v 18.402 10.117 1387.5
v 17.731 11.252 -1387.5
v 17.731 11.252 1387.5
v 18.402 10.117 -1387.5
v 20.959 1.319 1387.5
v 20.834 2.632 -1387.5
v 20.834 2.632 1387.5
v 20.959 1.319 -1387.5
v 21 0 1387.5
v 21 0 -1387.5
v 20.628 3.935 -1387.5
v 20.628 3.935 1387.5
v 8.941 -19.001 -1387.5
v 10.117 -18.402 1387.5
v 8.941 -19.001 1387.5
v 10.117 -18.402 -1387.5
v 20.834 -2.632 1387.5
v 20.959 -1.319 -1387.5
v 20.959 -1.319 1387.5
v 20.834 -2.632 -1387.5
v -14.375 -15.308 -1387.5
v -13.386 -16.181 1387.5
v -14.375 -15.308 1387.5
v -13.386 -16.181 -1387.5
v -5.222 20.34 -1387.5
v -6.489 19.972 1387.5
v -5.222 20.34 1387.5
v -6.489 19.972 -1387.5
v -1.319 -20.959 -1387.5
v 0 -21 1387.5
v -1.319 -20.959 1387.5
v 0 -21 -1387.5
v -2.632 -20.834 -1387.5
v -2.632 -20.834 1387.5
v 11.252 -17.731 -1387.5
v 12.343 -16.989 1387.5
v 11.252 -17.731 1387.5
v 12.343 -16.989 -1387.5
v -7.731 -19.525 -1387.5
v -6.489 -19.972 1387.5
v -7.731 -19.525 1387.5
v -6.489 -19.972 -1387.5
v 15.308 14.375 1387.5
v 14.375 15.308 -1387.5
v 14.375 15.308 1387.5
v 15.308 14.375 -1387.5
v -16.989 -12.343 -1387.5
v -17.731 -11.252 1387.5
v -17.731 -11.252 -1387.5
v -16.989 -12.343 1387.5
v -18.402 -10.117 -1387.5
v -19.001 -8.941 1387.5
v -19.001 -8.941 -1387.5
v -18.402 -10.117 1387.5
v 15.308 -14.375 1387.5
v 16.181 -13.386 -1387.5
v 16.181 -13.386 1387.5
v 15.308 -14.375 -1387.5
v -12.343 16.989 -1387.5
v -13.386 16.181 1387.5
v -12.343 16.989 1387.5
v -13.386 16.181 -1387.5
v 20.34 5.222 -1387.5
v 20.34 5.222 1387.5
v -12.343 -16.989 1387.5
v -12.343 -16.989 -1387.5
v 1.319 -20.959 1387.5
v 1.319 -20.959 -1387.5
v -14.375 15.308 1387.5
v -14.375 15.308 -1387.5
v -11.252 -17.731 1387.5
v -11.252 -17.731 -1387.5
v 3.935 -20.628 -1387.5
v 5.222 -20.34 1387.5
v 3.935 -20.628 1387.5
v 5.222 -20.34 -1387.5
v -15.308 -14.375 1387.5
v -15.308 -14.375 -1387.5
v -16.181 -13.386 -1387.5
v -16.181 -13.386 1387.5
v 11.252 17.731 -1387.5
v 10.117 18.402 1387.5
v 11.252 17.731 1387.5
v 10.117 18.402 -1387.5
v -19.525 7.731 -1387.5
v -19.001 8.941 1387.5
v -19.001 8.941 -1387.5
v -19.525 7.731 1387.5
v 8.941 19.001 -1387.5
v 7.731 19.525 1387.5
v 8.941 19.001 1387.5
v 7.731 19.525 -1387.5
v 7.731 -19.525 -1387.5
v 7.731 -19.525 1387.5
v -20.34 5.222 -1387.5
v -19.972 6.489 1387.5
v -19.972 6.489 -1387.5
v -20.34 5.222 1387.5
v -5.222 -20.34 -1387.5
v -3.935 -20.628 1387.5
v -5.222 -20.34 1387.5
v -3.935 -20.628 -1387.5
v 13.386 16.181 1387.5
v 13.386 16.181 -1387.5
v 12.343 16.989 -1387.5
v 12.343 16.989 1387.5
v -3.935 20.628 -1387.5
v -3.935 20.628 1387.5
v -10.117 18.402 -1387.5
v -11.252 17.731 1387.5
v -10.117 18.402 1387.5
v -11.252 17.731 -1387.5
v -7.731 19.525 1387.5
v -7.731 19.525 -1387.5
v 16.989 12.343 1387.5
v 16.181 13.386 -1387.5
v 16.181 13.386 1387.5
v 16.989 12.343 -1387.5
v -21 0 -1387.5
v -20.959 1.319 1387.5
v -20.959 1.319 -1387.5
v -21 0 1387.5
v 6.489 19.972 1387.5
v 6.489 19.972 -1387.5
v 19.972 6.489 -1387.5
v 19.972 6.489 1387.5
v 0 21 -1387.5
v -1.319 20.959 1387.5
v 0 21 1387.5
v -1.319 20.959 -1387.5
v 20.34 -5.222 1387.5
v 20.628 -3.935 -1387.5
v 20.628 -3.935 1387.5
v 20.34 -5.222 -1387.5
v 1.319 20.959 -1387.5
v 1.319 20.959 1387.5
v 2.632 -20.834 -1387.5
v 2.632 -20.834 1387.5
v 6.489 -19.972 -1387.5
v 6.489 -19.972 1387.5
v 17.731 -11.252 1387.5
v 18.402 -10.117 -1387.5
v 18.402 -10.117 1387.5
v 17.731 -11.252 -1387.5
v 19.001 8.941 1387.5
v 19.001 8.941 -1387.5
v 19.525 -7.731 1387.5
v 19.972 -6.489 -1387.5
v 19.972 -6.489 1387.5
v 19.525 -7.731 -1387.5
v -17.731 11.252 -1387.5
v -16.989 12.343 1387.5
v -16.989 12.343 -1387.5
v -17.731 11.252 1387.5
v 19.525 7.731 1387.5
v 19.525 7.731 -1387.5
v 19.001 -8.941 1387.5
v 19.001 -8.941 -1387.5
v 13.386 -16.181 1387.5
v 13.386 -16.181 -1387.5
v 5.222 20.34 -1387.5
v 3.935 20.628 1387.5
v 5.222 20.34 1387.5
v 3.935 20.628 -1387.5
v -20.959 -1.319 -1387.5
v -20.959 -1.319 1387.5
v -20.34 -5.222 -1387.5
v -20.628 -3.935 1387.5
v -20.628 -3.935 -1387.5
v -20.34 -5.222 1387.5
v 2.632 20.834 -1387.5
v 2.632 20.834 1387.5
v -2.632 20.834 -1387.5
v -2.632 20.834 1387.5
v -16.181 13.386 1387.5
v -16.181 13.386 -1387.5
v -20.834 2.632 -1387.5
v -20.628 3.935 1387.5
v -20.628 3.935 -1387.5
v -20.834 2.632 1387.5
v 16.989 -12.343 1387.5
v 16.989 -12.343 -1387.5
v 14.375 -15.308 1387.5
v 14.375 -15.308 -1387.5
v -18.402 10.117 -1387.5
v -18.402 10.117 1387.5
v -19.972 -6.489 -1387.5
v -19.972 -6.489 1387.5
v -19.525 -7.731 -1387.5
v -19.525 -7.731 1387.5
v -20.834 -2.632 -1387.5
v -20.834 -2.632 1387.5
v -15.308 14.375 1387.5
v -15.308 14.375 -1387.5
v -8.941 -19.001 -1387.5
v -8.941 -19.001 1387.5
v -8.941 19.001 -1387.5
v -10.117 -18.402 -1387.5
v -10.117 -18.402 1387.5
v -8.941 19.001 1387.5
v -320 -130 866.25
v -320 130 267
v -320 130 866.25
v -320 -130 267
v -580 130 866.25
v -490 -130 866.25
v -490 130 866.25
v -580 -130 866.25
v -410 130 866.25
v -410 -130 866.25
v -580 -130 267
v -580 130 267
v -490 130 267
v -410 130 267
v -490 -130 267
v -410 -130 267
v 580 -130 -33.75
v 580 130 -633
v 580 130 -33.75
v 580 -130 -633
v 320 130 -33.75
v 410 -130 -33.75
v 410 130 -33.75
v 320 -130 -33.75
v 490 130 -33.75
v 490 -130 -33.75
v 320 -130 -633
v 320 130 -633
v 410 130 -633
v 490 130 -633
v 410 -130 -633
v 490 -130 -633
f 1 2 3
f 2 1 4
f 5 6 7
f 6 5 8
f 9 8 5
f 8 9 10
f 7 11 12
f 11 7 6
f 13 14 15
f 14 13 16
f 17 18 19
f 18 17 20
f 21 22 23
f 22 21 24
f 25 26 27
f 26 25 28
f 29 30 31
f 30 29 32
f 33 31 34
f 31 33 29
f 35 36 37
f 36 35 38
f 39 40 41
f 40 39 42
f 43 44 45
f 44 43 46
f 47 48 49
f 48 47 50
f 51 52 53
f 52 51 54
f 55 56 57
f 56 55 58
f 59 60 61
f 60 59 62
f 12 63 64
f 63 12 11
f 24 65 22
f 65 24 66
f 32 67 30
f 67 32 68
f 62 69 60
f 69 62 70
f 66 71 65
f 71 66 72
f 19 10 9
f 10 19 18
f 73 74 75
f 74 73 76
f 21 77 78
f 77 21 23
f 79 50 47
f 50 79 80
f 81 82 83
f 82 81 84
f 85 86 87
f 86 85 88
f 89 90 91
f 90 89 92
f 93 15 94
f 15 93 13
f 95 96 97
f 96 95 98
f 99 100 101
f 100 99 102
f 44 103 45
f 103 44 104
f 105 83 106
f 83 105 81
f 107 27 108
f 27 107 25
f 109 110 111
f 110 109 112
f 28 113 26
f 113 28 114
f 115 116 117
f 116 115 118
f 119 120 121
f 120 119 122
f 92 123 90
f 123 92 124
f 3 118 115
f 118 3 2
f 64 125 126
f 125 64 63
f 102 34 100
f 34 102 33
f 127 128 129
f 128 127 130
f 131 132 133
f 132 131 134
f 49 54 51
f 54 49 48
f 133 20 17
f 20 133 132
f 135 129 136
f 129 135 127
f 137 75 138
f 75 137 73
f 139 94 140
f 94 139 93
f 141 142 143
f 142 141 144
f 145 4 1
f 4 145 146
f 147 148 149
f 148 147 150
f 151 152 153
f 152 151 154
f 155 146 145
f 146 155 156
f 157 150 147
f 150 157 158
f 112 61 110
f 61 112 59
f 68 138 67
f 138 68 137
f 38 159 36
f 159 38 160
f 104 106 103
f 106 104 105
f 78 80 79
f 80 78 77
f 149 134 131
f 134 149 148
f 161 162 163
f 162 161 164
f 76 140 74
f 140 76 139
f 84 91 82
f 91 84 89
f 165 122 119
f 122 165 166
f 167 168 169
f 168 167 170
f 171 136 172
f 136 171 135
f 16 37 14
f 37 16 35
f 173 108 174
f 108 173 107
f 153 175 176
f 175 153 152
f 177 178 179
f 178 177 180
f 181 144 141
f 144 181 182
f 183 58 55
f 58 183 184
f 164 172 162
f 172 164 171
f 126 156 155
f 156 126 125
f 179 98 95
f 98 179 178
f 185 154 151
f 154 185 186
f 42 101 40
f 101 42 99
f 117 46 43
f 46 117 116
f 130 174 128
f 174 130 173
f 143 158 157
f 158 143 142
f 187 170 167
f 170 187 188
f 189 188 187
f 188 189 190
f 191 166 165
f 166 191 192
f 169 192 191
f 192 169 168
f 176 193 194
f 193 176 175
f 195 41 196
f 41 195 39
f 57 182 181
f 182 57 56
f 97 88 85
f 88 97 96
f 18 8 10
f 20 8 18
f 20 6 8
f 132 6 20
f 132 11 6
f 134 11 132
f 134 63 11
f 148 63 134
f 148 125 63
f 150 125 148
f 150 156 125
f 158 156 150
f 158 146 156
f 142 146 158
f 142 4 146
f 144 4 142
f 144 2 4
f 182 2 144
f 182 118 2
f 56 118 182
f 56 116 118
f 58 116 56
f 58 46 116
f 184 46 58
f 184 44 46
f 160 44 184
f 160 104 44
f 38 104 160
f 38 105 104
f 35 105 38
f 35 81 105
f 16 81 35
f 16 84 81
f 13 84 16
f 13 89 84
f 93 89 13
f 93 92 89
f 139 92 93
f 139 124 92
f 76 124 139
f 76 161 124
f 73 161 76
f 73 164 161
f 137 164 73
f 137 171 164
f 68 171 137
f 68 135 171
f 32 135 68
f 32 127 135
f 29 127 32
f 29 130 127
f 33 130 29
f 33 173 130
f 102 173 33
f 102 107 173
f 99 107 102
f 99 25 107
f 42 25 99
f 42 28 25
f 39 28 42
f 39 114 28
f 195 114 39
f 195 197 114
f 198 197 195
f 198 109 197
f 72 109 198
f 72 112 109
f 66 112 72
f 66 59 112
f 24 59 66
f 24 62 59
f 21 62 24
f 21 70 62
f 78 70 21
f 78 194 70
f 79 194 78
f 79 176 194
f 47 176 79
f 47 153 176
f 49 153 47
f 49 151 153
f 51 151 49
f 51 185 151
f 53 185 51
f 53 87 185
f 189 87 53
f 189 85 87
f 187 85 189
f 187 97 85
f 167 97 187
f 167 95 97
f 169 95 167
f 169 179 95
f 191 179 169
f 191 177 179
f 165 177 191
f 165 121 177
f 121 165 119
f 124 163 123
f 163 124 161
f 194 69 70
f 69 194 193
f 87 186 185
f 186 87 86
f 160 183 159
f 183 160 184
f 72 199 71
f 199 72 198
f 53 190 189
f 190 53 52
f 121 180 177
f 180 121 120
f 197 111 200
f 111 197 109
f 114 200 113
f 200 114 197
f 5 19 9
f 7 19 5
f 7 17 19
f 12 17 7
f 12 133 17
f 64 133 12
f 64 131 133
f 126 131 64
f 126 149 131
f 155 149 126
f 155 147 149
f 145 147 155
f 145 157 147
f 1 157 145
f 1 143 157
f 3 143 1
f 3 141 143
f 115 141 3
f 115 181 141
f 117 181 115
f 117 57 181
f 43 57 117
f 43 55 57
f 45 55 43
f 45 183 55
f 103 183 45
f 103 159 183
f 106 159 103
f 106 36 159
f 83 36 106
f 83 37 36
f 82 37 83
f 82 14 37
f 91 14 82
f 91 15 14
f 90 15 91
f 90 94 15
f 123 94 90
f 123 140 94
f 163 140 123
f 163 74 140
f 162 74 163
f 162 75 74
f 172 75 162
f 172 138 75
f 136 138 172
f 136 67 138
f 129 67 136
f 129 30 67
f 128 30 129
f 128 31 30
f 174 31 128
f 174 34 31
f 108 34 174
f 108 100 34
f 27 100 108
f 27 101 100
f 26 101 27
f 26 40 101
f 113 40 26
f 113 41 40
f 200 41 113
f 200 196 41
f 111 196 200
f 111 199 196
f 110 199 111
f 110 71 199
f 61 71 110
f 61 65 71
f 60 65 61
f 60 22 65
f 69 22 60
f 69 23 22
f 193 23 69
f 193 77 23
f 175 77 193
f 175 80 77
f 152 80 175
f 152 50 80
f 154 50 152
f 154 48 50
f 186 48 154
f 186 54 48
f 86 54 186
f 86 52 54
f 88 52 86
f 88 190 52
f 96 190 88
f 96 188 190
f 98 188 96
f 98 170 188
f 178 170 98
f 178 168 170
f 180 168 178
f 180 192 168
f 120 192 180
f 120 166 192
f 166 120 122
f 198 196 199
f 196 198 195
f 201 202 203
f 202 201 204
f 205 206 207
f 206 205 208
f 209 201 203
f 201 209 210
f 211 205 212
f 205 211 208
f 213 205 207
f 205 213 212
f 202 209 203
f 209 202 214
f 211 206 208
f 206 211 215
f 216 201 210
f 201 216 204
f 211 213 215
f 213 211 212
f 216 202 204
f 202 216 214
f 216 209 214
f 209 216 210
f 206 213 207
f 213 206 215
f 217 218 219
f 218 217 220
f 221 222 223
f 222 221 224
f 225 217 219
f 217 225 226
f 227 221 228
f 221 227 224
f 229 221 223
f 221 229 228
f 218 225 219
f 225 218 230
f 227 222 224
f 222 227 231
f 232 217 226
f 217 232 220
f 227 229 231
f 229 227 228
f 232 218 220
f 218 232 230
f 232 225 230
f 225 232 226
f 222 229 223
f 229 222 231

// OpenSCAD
// ============================================================================
// PROJECT: XXXG-00W0 WING GUNDAM ZERO EW - LOWER ARM SKELETAL ARCHITECTURE
// COMPONENT VAULT: BANDAI CAST RUNNER B - FOREARM BACKBONES B3 & B4
// MANUFACTURING SPEC: SOLID-STATE CAST-IN POWER RAILS FOR SQUARE-WAVE BUS
// MASS CHECK: PRE-ARMOR WEIGHT PROFILE BALANCING MANDATE FOR 16.7M MECHA
// ============================================================================

$fn = 100; // Circular segment resolution calculation count

// Sizing Constants Scaled 1:1 for a 16.7-Meter Airframe Scale (mm)
forearm_bone_length = 1850;             // Total vertical lower arm height (mm)
wrist_track_diameter = 420;             // Wrist rotation cycloidal reducer track width (mm)
skeletal_core_wall = 50;                // Thick TiAl internal structural bone thickness (mm)
harness_conduit_width = 80;             // Embedded 4oz copper logic trace track width (mm)

module Runner_B_Forearm_Forge() {
    // Central Supply Injection Runner Axis (Molten Feed Line from Siphon Forge)
    color([0.22, 0.22, 0.24]) {
        cylinder(h = forearm_bone_length * 1.5, d = 42, center = true);
        // Direct injection gates tracking straight into the part mold cavities
        translate() rotate() cylinder(h = 450, d = 22);
        translate([0, 0, -500]) rotate() cylinder(h = 450, d = 22);
    }
    
    // Instantiate Scaled Structural Part Molds Symmetrically
    Cast_Internal_Forearm_Backbones();
}

module Cast_Internal_Forearm_Backbones() {
    // ---- PART B3: INTERNAL LEFT FOREARM SKELETAL STRUT ---- [Page 6, Step 3]
    translate([-450, 0, 450]) color([0.4, 0.4, 0.42]) {
        difference() {
            // Main solid internal forearm skeletal structural column
            cube([260, 260, forearm_bone_length * 0.45], center = true);
            
            // Integrated Cycloidal Wrist Rotation Track Housing Bore
            translate([0, 0, -(forearm_bone_length * 0.18)])
                rotate()
                    cylinder(h = 300, d = wrist_track_diameter, center = true);
            
            // Continuous cast-in routing track for the 4oz solid-state wiring rails
            cube([harness_conduit_width, 300, forearm_bone_length], center = true);
        }
    }
    
    // ---- PART B4: INTERNAL RIGHT FOREARM SKELETAL STRUT ---- [Page 6, Step 3]
    translate([450, 0, -450]) rotate() color([0.4, 0.4, 0.42]) {
        difference() {
            cube([260, 260, forearm_bone_length * 0.45], center = true);
            translate([0, 0, -(forearm_bone_length * 0.18)])
                rotate()
                    cylinder(h = 300, d = wrist_track_diameter, center = true);
            cube([harness_conduit_width, 300, forearm_bone_length], center = true);
        }
    }
}

// Render Master Assembly to Parameter Workspace
Runner_B_Forearm_Forge();
